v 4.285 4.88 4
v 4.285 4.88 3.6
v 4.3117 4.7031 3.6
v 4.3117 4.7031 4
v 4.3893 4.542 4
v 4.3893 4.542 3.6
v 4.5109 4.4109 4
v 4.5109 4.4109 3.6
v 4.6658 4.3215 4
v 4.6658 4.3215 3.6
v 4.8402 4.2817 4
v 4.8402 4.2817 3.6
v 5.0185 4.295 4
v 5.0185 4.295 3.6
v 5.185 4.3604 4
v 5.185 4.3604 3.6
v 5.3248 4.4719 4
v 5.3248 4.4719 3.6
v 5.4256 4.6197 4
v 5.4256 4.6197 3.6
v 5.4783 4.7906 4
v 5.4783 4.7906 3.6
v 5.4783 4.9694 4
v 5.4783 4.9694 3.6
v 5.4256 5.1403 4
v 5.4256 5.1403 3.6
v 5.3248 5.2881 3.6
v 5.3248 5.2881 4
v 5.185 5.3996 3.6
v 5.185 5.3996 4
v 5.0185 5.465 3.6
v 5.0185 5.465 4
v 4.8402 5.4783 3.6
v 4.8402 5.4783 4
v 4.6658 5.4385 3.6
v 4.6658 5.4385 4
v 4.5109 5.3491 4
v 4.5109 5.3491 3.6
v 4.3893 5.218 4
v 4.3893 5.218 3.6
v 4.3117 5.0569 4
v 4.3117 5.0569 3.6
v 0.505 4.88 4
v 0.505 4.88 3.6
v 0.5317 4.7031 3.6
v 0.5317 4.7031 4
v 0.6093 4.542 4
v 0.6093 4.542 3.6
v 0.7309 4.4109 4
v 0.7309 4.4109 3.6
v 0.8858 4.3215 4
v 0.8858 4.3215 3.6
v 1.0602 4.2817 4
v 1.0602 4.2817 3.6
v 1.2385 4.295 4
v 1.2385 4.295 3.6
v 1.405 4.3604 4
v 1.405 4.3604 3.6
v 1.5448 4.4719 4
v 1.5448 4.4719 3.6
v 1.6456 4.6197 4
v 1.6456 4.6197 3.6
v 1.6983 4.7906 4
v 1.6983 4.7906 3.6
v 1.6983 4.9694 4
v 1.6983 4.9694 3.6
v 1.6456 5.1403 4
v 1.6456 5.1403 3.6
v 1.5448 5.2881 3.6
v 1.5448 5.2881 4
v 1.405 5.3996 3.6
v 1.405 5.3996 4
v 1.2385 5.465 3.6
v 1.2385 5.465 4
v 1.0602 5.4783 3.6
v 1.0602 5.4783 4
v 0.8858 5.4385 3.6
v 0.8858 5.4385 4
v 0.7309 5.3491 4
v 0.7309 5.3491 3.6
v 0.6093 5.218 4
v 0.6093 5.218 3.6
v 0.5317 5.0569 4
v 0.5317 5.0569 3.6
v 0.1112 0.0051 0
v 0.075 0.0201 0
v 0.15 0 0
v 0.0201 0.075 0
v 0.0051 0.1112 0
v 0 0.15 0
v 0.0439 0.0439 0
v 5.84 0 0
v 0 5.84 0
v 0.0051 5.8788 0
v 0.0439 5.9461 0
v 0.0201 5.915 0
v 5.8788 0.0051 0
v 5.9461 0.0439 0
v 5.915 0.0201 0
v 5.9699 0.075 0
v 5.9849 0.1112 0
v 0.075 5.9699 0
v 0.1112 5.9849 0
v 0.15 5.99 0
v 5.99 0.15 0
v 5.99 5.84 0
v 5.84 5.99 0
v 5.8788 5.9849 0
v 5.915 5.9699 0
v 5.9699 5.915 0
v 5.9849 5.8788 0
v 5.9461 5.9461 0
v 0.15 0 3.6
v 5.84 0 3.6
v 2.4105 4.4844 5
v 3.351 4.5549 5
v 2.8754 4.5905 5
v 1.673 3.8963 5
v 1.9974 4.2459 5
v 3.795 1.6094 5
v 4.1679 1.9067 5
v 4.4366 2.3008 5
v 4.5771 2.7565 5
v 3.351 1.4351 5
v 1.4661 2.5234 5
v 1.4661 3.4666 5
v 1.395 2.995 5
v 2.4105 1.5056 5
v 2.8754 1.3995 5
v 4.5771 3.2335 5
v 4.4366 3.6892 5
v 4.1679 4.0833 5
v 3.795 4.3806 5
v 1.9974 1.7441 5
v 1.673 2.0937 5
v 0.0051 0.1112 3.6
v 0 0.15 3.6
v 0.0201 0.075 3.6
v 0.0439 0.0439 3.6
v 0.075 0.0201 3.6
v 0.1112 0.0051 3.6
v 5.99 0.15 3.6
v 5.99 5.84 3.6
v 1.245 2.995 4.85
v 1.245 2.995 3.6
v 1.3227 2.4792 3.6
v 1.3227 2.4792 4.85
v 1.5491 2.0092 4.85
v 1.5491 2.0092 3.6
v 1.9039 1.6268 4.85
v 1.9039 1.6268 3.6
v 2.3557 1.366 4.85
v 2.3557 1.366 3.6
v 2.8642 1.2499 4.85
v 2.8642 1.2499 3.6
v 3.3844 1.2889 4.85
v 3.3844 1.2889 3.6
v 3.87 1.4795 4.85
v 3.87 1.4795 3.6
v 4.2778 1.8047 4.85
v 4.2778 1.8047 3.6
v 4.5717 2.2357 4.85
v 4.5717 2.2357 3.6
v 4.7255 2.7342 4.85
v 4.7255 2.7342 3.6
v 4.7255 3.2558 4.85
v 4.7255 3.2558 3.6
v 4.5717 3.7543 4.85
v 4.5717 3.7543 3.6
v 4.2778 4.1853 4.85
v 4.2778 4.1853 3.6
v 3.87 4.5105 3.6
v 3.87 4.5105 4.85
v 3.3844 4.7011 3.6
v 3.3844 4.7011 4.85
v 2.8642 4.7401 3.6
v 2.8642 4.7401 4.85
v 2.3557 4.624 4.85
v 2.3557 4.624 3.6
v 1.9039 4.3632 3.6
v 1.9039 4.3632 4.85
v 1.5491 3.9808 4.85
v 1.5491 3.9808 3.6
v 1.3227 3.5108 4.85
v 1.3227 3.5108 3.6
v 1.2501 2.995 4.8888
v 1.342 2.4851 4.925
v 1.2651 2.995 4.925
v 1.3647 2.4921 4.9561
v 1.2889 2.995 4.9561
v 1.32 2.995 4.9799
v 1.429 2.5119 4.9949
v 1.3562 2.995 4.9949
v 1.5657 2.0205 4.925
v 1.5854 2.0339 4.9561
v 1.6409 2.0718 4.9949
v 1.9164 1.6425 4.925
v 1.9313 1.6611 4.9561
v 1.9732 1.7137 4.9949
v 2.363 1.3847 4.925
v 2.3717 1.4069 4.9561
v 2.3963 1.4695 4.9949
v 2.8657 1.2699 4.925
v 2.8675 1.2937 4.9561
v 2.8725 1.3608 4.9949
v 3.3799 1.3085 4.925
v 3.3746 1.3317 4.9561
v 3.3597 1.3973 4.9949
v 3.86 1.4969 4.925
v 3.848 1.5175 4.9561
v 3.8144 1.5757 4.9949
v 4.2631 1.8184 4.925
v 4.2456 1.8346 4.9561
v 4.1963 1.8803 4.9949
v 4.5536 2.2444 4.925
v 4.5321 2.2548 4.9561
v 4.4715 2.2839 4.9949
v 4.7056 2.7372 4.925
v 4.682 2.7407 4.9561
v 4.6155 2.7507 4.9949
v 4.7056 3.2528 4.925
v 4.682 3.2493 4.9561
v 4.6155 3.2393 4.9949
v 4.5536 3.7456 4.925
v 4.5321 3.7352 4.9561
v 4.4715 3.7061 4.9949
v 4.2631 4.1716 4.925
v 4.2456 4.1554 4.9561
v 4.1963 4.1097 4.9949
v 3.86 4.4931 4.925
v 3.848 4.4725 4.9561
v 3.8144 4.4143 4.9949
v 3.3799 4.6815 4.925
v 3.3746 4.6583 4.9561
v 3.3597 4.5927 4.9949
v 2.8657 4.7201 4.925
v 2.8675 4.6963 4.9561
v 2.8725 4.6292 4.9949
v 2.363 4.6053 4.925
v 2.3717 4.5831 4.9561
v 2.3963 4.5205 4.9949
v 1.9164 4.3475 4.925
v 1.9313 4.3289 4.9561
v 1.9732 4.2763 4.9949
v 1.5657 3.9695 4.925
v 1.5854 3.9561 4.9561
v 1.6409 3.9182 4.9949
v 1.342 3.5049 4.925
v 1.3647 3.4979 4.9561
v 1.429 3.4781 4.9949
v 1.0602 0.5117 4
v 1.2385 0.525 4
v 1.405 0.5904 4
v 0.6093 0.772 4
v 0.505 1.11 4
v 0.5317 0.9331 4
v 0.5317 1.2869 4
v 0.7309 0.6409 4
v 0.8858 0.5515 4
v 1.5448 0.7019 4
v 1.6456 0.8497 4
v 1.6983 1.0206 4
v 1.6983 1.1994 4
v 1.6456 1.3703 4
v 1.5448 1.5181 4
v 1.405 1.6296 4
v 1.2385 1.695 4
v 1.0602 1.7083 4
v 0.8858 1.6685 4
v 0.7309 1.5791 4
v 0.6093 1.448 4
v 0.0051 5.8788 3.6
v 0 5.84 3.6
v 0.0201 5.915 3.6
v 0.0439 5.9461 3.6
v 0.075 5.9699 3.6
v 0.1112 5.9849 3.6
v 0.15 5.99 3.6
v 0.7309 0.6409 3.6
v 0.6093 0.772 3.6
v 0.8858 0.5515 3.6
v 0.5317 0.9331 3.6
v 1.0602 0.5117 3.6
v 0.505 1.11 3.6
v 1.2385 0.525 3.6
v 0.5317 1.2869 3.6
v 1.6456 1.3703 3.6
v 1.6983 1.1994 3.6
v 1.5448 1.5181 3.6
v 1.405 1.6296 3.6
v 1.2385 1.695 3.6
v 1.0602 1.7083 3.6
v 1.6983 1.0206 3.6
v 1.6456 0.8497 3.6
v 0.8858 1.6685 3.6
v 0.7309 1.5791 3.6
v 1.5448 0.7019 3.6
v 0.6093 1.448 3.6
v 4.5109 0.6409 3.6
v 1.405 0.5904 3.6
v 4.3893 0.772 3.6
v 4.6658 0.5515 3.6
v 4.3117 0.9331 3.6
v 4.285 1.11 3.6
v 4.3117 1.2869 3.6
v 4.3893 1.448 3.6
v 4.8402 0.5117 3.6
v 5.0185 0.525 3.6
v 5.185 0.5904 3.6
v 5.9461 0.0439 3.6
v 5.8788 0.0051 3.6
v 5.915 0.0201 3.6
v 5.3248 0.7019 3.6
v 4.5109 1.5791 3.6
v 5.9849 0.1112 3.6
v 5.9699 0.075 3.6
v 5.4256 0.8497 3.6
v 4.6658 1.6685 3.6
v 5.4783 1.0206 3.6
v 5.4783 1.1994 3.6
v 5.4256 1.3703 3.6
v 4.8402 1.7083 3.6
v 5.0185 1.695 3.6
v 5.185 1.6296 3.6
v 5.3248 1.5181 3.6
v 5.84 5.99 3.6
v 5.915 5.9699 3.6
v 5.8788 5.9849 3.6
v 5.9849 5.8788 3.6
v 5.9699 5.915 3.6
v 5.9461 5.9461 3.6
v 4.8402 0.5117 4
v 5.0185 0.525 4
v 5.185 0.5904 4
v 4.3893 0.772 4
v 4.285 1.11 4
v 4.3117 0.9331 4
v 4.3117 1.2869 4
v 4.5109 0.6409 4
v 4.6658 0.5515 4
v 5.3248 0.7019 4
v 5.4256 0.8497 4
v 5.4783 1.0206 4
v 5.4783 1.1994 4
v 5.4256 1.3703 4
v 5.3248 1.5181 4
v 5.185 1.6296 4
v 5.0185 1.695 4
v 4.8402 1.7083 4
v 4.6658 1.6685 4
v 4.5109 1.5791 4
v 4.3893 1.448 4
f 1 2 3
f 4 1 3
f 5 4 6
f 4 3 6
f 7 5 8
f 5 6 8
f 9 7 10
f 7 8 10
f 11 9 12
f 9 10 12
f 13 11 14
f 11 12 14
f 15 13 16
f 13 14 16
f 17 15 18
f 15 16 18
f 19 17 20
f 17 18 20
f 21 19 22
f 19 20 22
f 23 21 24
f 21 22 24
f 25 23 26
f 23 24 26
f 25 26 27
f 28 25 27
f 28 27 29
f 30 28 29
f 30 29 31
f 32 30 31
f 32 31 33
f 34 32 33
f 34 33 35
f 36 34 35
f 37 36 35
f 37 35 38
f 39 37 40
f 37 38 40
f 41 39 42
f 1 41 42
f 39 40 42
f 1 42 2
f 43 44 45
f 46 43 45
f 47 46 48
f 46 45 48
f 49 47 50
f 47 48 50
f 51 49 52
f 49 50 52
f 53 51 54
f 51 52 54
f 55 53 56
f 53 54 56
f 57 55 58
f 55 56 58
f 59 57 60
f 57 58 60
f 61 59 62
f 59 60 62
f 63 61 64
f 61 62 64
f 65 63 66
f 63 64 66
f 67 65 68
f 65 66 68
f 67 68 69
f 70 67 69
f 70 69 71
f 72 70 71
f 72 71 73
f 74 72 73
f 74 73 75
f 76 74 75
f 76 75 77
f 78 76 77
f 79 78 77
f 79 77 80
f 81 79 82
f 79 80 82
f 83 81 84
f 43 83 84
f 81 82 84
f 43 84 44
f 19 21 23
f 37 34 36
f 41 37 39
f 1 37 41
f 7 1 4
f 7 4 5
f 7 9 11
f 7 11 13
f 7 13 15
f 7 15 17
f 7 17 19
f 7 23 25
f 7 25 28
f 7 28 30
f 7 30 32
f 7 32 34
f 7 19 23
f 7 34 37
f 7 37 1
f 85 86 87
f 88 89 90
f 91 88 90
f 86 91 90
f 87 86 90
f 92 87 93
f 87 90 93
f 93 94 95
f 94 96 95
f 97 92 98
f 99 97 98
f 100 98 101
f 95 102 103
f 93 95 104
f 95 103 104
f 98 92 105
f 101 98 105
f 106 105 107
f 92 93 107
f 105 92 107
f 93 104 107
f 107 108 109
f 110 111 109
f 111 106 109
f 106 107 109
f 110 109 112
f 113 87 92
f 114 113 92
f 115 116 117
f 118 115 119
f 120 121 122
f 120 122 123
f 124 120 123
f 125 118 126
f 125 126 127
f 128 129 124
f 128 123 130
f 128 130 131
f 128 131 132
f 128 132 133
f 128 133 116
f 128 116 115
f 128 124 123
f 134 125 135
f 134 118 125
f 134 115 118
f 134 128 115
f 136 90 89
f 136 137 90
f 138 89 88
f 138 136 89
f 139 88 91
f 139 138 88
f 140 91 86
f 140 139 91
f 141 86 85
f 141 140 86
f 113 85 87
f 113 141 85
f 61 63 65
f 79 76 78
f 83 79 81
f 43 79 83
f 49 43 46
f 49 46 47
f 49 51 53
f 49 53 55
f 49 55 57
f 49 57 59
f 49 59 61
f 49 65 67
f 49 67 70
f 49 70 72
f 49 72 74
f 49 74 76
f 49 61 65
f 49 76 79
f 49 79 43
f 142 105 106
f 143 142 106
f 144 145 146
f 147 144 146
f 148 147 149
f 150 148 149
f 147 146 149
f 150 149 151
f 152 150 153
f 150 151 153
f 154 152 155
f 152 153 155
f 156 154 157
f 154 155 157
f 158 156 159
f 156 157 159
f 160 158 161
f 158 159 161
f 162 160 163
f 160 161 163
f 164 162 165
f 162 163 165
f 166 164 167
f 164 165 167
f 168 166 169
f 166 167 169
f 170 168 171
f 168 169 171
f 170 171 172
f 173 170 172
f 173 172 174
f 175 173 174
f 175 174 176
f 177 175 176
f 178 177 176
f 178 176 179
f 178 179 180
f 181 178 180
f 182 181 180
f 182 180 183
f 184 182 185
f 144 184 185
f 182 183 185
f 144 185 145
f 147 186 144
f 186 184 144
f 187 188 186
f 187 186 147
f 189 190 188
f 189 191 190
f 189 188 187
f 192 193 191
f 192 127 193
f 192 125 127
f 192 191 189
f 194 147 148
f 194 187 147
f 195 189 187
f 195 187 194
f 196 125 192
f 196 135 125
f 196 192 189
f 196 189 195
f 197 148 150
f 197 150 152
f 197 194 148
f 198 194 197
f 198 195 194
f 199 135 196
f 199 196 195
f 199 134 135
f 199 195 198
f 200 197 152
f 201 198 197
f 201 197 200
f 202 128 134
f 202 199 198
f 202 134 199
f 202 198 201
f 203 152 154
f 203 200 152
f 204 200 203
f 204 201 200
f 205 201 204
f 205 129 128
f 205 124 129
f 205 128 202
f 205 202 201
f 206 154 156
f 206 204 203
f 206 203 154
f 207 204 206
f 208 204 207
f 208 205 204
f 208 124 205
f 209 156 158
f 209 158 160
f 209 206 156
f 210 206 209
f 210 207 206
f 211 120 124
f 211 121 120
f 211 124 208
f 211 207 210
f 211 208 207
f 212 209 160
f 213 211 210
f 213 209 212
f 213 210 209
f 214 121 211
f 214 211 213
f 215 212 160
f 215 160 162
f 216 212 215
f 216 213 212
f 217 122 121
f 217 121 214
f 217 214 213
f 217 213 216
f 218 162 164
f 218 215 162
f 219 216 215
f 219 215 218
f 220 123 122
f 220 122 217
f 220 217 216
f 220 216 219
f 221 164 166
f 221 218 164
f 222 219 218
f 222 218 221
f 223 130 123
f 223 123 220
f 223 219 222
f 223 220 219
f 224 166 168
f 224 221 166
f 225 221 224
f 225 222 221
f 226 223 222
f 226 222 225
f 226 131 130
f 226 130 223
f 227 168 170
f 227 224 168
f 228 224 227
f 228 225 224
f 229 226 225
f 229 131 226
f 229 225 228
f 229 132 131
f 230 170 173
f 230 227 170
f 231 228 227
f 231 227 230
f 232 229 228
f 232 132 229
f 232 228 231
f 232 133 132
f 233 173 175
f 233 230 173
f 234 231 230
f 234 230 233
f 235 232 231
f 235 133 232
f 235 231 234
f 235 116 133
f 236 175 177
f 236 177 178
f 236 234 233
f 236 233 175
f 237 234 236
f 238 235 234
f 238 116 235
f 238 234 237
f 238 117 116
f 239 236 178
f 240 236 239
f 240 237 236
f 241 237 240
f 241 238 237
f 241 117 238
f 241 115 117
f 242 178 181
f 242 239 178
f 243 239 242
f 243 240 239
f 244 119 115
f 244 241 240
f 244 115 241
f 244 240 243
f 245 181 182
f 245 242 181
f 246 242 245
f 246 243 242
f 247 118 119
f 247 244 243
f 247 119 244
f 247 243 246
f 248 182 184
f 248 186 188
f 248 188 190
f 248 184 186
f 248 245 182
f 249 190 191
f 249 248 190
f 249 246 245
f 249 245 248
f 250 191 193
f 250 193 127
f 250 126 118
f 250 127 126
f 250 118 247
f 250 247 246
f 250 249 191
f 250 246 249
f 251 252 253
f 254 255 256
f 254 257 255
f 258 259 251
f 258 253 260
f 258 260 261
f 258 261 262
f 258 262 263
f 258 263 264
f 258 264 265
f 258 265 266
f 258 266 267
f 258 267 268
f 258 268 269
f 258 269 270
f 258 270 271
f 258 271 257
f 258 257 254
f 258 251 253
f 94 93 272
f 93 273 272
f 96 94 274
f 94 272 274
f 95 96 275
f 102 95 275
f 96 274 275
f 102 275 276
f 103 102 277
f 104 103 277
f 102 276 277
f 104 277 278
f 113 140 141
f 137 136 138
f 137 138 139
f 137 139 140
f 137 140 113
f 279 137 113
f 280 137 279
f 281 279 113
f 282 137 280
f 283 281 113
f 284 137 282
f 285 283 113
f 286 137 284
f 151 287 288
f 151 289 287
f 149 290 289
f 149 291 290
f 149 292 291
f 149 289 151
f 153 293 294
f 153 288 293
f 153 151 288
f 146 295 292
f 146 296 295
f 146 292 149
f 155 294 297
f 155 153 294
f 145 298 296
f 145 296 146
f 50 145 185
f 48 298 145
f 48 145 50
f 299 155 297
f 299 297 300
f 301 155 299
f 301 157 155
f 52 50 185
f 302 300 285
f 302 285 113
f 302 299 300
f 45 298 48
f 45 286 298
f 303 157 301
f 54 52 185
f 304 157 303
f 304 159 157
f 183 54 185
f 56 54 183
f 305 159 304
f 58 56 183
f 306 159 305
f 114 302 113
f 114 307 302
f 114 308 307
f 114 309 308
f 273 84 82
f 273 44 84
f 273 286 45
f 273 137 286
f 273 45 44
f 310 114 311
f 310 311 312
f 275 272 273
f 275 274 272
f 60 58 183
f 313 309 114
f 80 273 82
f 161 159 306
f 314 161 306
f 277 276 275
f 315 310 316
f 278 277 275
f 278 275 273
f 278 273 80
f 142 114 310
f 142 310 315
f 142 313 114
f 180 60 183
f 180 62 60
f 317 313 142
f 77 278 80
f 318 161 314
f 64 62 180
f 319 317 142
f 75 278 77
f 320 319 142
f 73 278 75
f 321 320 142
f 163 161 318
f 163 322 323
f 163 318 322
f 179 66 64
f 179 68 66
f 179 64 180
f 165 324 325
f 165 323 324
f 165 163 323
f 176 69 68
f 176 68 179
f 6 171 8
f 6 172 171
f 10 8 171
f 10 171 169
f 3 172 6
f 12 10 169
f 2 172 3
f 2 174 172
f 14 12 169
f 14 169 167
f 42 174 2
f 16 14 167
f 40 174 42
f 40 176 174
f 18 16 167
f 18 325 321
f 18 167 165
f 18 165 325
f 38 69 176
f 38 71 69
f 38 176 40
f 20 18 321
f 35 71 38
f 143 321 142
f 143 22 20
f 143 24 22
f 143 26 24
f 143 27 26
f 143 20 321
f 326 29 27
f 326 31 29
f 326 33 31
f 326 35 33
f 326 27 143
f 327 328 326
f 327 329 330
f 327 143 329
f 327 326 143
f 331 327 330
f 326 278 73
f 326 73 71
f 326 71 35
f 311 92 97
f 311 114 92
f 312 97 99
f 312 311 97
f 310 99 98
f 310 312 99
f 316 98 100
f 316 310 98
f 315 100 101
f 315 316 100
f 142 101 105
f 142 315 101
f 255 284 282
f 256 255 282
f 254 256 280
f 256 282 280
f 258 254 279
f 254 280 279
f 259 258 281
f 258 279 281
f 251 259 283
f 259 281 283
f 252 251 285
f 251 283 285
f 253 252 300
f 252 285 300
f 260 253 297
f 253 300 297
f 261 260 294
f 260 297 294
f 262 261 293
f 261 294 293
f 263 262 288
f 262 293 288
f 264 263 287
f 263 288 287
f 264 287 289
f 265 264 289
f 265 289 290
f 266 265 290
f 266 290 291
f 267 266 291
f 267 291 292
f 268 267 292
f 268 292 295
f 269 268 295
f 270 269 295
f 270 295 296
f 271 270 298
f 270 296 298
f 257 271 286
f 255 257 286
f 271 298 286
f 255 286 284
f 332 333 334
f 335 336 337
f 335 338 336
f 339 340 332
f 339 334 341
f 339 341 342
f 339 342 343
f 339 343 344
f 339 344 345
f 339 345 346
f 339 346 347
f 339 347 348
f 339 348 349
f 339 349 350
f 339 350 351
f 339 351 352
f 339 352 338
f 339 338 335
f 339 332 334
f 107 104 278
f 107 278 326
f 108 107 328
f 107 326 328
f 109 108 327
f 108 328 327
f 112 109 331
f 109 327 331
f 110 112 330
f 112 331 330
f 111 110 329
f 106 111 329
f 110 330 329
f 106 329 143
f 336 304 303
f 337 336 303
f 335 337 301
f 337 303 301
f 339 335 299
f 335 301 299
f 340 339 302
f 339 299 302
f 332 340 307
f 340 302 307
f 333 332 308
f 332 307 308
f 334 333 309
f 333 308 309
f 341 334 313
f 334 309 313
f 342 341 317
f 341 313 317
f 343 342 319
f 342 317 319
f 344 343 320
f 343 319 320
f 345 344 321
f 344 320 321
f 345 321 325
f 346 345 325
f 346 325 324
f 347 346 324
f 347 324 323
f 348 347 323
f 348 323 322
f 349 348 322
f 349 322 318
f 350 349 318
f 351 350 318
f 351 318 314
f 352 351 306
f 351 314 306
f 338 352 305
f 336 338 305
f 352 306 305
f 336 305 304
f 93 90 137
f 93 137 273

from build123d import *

# Parameters (mm, degrees)
SKETCH2_W           = 5.99
SKETCH2_H           = 5.99
BOSS_EXTRUDE1_DEPTH = 3.6
SKETCH3_R           = 1.75
BOSS_EXTRUDE2_DEPTH = 1.4
FILLET1_R           = 0.15
SKETCH5_R           = 0.6
BOSS_EXTRUDE3_DEPTH = 0.4


with BuildPart() as part:
    # Sketch2 → Boss-Extrude1 (new body)
    with BuildSketch(Plane.XY):
        with Locations((2.995, 2.995)):
            Rectangle(SKETCH2_W, SKETCH2_H)
    extrude(amount=BOSS_EXTRUDE1_DEPTH)

    # Sketch3 → Boss-Extrude2 (add)
    with BuildSketch(Plane.XY.offset(3.6)):
        with Locations(Location((2.995, 2.995, 0), (0, 0, 180))):
            Circle(SKETCH3_R)
    extrude(amount=BOSS_EXTRUDE2_DEPTH)

    # Fillet1
    fillet1_edges = [part.edges().sort_by_distance(p)[0] for p in [
        (4.745, 2.995, 5),
        (0, 5.99, 1.8),
        (5.99, 5.99, 1.8),
        (5.99, 0, 1.8),
        (0, 0, 1.8),
    ]]
    fillet(fillet1_edges, radius=FILLET1_R)

    # Sketch5 → Boss-Extrude3 (add)
    with BuildSketch(Plane.XY.offset(3.6)):
        with Locations(Location((1.105, 4.88, 0), (0, 0, 180))):
            Circle(SKETCH5_R)
        with Locations(Location((4.885, 4.88, 0), (0, 0, 180))):
            Circle(SKETCH5_R)
        with Locations(Location((4.885, 1.11, 0), (0, 0, 180))):
            Circle(SKETCH5_R)
        with Locations(Location((1.105, 1.11, 0), (0, 0, 180))):
            Circle(SKETCH5_R)
    extrude(amount=BOSS_EXTRUDE3_DEPTH)


solid = part.part
